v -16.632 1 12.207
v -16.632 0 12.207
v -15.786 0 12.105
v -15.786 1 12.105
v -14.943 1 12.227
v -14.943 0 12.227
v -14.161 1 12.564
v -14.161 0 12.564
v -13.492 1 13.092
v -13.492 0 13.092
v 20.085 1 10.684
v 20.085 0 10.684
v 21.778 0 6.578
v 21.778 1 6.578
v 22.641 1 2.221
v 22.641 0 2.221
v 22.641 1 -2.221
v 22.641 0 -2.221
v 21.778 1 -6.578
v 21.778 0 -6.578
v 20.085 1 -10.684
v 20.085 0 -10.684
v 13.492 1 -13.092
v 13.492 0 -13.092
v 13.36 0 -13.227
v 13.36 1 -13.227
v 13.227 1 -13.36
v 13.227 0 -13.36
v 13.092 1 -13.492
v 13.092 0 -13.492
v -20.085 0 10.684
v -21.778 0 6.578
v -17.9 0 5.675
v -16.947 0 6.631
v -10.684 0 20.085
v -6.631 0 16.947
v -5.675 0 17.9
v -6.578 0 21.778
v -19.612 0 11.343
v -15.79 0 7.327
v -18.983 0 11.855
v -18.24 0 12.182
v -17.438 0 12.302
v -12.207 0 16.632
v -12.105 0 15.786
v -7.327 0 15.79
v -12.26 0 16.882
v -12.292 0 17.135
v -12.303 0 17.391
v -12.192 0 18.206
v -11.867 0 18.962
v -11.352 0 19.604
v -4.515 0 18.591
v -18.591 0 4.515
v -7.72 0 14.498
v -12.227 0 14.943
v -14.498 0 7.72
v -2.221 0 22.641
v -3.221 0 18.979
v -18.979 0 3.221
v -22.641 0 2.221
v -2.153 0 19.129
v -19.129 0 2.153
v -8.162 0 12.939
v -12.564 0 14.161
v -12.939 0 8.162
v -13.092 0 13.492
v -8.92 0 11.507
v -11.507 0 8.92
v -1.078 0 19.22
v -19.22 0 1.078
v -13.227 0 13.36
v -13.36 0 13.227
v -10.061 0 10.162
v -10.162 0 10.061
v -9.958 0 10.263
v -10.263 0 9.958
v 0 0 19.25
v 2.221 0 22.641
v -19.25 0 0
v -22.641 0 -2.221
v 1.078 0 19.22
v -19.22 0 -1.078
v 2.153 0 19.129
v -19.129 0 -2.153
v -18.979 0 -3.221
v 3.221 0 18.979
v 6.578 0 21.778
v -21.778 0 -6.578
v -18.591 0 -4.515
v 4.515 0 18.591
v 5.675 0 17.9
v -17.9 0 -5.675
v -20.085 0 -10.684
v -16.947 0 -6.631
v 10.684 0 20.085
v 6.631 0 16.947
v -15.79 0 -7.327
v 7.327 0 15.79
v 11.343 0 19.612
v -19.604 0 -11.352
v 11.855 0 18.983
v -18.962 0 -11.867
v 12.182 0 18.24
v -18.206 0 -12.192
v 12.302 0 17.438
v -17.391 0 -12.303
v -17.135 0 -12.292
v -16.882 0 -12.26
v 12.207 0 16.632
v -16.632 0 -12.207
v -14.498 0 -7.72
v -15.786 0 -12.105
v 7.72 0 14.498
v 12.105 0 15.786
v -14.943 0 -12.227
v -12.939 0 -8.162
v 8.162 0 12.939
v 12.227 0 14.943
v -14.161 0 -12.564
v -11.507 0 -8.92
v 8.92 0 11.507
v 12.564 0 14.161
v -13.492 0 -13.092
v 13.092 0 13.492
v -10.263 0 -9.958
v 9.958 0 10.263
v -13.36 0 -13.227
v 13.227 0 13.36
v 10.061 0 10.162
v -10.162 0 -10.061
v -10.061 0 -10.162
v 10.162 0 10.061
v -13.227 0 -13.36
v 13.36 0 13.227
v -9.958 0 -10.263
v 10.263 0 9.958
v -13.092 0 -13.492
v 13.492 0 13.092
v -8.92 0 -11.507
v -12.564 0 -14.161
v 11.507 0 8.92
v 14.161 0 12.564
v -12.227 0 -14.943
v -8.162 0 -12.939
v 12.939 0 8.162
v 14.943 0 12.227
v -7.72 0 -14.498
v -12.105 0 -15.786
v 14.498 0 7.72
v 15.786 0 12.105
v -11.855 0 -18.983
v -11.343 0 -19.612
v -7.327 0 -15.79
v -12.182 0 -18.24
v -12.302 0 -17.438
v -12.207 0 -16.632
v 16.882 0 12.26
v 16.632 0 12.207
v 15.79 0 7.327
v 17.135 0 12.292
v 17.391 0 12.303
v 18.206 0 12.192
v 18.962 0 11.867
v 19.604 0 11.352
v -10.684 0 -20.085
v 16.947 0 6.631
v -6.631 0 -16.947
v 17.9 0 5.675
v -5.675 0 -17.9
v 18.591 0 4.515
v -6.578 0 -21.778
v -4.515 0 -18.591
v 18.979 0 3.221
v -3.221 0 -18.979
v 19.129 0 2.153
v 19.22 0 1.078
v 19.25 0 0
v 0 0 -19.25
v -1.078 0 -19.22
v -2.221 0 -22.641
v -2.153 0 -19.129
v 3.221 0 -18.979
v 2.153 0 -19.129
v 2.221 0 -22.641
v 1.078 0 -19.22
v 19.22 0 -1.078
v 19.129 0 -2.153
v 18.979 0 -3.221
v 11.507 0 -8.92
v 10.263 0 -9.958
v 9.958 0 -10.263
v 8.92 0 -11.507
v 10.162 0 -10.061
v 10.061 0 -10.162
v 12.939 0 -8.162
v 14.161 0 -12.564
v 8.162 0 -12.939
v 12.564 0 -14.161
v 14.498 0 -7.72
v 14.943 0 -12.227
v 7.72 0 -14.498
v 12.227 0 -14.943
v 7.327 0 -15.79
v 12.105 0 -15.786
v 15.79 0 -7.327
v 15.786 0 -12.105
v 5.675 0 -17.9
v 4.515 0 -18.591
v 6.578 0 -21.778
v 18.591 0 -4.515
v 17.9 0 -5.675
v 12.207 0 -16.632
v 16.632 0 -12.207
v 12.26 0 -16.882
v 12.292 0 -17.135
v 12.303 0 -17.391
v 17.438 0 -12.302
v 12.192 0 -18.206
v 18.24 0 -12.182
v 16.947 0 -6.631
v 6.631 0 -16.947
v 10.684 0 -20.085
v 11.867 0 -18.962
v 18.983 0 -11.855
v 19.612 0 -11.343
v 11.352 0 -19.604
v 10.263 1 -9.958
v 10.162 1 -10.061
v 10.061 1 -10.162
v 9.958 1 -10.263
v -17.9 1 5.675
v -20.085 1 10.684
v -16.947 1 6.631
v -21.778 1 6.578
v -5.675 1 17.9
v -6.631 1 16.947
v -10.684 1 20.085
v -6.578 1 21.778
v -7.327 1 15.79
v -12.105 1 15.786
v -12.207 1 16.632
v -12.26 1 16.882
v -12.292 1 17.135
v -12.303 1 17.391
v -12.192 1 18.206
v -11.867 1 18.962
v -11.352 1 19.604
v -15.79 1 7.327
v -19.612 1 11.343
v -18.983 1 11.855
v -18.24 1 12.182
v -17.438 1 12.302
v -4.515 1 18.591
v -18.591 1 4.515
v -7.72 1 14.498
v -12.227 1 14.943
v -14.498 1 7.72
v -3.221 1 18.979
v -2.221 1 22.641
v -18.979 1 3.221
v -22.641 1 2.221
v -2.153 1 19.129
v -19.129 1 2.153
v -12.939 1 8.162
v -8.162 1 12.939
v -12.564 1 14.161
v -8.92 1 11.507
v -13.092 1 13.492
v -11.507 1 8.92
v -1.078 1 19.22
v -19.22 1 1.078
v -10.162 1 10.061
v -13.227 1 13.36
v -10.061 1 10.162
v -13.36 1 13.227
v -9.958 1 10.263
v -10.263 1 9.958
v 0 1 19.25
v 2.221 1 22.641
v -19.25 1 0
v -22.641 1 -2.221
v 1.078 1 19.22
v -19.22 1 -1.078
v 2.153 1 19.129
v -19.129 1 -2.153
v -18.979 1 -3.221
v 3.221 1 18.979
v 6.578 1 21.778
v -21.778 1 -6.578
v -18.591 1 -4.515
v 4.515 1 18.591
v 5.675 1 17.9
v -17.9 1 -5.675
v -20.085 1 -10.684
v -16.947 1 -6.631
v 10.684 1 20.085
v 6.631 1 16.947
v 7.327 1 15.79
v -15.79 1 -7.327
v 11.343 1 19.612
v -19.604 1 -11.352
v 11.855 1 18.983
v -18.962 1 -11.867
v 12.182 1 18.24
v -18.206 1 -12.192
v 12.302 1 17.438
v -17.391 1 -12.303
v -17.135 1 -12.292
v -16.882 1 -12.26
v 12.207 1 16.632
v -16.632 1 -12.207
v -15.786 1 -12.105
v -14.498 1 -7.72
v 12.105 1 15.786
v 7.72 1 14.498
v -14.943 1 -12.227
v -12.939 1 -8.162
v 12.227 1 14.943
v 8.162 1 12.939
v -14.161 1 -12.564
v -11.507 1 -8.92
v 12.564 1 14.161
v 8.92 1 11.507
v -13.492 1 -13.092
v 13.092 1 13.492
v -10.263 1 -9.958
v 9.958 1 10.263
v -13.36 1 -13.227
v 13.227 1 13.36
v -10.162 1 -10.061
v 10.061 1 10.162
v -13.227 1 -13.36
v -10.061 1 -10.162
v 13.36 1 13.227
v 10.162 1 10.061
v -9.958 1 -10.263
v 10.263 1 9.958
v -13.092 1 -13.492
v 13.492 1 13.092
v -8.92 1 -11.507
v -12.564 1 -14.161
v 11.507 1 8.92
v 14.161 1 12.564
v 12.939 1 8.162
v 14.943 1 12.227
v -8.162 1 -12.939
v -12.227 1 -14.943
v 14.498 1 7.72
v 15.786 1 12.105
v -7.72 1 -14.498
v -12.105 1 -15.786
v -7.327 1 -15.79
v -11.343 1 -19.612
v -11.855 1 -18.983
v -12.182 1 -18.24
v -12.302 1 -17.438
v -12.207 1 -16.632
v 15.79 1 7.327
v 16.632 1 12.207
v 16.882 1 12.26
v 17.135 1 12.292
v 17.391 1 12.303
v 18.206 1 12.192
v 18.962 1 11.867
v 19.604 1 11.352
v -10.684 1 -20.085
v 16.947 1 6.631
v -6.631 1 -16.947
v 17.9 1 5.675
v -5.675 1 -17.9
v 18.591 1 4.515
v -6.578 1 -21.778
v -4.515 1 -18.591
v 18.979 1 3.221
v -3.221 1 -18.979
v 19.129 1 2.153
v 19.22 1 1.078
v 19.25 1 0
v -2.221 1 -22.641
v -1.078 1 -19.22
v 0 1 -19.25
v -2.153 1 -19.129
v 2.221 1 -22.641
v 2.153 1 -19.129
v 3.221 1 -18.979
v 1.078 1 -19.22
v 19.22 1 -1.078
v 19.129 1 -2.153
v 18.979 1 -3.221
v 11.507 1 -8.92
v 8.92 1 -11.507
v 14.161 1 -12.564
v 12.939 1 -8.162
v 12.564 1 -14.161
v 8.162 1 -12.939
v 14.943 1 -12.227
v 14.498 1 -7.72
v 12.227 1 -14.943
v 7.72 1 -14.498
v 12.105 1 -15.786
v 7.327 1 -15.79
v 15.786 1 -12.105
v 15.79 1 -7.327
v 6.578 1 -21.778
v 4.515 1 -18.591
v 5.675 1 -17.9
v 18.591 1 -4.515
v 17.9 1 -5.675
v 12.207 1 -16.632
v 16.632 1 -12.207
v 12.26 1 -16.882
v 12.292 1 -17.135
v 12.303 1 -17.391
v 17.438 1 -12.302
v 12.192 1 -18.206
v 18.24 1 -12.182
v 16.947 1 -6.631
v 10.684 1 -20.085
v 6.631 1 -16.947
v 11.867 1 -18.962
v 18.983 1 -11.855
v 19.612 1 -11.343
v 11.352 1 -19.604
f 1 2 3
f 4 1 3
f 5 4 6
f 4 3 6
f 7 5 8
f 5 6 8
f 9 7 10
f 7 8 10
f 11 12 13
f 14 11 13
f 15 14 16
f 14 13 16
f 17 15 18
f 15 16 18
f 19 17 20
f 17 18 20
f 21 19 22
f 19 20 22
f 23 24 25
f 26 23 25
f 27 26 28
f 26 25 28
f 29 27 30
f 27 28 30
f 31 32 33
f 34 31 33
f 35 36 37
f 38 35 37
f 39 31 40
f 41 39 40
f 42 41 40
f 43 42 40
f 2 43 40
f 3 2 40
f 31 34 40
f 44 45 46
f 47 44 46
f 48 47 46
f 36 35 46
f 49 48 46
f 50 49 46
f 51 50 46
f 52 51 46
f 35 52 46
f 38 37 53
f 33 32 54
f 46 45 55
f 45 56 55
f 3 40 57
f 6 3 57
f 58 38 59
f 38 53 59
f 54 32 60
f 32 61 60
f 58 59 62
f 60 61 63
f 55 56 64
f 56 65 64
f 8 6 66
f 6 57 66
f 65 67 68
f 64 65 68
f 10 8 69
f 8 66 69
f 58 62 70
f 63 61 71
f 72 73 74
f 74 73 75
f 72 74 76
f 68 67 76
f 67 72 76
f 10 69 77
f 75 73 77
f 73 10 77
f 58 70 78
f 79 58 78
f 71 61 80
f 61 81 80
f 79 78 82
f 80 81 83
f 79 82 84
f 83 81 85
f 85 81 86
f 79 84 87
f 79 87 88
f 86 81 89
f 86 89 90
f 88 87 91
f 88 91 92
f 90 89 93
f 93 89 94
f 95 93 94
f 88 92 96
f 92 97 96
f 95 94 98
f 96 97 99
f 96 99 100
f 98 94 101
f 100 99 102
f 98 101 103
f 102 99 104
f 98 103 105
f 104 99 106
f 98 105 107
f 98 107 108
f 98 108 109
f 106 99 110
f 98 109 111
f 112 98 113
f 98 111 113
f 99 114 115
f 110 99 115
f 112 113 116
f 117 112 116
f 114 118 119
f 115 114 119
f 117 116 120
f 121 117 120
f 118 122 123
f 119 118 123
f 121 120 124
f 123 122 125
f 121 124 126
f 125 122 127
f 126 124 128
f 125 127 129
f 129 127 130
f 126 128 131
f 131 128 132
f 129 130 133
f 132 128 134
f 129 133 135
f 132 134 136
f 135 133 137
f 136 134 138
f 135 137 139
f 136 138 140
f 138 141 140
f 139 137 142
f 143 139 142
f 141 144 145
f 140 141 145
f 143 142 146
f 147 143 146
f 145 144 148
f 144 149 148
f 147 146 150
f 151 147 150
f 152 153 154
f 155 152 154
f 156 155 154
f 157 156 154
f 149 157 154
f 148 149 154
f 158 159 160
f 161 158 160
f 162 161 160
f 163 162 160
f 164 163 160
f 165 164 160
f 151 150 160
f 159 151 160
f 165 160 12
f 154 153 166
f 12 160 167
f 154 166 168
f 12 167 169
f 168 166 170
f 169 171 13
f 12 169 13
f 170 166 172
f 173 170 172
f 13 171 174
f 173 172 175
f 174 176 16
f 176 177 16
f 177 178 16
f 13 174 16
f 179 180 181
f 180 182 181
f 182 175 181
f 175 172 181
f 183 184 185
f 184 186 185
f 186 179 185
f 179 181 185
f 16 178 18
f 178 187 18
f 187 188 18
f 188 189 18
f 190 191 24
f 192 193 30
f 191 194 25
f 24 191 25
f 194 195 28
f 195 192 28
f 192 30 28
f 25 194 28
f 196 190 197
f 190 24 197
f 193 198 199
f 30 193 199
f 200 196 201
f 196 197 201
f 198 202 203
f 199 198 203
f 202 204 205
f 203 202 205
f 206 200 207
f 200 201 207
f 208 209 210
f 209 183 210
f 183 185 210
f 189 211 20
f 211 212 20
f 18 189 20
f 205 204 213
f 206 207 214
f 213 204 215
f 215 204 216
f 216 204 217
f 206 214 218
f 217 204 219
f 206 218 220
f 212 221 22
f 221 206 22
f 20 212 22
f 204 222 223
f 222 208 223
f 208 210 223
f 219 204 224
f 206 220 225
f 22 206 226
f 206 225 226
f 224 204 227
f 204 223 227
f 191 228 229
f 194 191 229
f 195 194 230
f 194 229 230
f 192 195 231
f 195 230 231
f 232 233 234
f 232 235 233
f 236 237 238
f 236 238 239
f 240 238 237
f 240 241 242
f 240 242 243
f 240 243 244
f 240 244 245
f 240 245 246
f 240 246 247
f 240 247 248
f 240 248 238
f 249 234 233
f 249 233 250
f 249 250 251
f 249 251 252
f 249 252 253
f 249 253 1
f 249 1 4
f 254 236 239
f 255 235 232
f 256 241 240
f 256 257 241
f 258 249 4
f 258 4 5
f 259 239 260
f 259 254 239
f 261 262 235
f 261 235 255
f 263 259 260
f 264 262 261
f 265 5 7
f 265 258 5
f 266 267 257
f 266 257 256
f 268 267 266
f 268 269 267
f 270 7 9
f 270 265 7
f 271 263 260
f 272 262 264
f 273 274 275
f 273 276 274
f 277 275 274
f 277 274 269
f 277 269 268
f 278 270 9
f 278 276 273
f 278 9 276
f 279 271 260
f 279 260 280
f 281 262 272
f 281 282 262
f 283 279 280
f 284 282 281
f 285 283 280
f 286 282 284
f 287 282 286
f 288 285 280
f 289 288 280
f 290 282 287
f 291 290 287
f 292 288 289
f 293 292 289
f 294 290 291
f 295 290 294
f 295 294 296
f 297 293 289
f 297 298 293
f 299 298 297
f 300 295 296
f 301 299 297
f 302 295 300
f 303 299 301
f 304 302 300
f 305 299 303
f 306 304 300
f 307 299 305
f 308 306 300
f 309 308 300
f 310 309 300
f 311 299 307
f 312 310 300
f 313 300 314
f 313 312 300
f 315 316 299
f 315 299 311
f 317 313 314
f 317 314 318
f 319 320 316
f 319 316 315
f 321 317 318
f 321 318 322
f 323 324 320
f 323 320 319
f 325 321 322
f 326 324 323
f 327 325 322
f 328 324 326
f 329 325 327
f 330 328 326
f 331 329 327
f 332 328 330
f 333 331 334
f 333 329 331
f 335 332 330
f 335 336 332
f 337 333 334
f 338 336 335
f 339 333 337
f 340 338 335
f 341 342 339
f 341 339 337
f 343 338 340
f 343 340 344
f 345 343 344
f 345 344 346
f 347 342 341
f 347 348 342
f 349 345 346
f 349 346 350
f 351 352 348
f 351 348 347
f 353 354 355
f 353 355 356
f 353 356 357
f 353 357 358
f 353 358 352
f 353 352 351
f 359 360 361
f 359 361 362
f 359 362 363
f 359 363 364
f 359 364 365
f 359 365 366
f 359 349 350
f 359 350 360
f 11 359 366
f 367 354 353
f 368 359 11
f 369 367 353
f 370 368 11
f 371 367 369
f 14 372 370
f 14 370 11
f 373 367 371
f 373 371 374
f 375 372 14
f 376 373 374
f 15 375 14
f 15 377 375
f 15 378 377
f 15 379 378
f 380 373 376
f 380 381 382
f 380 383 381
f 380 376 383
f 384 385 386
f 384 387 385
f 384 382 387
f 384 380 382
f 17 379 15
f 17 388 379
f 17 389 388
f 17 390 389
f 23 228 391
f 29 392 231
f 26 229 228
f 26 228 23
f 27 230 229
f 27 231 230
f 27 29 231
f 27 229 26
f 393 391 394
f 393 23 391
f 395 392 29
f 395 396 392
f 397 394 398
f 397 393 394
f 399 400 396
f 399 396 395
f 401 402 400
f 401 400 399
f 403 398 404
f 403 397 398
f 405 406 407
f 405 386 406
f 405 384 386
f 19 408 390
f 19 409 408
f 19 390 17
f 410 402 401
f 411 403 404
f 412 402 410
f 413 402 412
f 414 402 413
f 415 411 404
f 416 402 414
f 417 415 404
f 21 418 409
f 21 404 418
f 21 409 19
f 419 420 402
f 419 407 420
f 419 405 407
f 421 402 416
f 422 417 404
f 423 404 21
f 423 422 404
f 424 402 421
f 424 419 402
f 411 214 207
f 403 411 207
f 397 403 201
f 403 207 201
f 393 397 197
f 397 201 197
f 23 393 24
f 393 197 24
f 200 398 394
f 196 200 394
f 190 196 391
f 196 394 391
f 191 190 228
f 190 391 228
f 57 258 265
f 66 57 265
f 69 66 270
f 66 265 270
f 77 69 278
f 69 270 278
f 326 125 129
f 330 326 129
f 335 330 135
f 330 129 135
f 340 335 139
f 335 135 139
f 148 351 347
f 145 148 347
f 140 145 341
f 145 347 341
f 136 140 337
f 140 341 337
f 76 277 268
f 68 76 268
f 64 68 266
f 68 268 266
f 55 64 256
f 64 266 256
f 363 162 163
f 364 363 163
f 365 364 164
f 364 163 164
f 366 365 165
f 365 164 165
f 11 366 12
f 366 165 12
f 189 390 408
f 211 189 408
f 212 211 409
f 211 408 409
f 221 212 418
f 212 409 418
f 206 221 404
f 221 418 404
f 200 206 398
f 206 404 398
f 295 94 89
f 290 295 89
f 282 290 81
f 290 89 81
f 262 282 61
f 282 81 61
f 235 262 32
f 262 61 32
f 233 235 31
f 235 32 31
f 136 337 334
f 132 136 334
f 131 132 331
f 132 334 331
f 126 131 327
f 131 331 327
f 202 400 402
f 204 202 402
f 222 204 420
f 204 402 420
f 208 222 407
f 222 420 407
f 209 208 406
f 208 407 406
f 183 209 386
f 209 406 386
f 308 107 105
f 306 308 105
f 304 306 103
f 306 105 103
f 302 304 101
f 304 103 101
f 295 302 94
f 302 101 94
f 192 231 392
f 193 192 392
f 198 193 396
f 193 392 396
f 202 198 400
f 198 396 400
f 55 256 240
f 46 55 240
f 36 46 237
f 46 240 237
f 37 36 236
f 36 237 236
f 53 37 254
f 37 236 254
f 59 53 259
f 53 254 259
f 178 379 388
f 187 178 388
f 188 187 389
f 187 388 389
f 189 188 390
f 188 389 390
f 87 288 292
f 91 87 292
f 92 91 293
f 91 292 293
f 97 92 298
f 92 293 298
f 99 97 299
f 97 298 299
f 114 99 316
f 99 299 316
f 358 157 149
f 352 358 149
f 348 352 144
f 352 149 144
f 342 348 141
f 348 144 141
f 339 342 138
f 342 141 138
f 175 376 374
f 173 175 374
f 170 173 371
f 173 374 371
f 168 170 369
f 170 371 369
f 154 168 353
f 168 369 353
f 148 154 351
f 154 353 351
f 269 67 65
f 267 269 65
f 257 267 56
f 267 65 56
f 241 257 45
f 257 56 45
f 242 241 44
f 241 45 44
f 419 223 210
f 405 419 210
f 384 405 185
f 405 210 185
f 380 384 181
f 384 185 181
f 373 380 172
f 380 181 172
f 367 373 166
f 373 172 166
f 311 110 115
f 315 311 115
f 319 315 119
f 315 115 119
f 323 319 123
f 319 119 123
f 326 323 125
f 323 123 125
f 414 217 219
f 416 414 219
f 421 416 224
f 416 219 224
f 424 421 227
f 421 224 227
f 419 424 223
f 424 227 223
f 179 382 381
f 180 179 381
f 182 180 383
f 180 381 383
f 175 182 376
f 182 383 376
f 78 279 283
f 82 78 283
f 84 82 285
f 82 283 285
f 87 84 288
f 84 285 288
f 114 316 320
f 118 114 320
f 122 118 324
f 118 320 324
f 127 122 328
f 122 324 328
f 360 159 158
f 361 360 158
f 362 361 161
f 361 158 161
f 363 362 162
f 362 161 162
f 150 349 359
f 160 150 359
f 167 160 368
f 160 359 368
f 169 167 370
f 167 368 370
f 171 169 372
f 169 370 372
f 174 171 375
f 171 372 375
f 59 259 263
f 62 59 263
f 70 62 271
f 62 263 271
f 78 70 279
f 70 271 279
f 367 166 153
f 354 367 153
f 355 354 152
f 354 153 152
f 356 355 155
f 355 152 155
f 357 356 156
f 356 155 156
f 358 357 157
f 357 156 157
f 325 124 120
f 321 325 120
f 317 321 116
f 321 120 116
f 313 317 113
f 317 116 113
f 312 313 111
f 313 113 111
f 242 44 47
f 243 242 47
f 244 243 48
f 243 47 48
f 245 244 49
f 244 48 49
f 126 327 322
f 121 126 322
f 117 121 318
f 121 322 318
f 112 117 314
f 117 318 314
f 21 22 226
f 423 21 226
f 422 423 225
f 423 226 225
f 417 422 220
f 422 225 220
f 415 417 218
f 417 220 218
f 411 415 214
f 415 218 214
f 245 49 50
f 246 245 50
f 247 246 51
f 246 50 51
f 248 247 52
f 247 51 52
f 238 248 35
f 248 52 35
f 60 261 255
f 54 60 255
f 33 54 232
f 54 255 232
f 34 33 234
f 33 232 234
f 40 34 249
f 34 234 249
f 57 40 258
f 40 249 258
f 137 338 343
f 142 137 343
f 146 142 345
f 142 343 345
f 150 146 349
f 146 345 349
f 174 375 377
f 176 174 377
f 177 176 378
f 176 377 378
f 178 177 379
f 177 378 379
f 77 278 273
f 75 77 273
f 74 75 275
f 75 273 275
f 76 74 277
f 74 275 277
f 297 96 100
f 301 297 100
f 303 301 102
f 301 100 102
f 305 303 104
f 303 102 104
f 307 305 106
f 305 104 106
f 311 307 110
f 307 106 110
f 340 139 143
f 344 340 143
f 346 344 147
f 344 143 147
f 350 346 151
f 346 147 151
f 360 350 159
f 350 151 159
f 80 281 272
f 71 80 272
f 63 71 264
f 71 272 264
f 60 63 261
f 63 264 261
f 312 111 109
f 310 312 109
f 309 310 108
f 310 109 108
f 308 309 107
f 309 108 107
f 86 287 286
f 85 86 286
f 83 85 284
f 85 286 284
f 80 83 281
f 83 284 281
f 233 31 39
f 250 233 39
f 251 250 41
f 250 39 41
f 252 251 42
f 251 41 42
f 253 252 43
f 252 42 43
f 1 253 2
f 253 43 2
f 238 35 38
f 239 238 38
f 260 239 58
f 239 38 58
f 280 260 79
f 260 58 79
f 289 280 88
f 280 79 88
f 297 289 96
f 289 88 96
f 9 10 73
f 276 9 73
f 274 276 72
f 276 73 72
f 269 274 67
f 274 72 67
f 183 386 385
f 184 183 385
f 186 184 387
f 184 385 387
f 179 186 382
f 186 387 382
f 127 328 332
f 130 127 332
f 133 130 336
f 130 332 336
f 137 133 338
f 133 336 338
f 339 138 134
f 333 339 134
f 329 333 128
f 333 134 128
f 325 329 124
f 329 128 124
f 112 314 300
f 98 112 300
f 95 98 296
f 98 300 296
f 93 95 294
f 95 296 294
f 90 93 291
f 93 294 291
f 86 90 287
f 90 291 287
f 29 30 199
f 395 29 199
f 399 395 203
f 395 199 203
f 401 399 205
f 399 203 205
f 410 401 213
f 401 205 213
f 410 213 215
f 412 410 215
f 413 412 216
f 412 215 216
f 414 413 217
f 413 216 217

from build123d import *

# Parameters (mm, degrees)
PCB_OUTLINE_OUTER_DEPTH = 1
CUT_EXTRUDE2_DEPTH      = 1
CUT_EXTRUDE2_DEPTH_BACK = 2


with BuildPart() as part:
    # Internal Slab → PCB Outline Outer (new body)
    with BuildSketch(Plane(origin=(0, 0, 0), x_dir=(1, 0, 0), z_dir=(0, 1, 0))):
        with BuildLine():
            ThreePointArc((20.085113617, 10.68413361), (18.622288868, 12.043250737), (16.632261242, 12.207097181))
            ThreePointArc((16.632261242, 12.207097181), (14.943199752, 12.226998501), (13.492265758, 13.091935102))
            ThreePointArc((13.492265758, 13.091935102), (13.293607486, 13.293607486), (13.091935102, 13.492265758))
            ThreePointArc((13.091935102, 13.492265758), (12.226998501, 14.943199752), (12.207097181, 16.632261242))
            ThreePointArc((12.207097181, 16.632261242), (12.278791735, 17.008431368), (12.302815994, 17.390618375))
            ThreePointArc((12.302815994, 17.390618375), (11.867033623, 18.962276517), (10.68413361, 20.085113617))
            ThreePointArc((10.68413361, 20.085113617), (0, 22.75), (-10.68413361, 20.085113617))
            ThreePointArc((-10.68413361, 20.085113617), (-12.043250737, 18.622288868), (-12.207097181, 16.632261242))
            ThreePointArc((-12.207097181, 16.632261242), (-12.226998501, 14.943199752), (-13.091935102, 13.492265758))
            ThreePointArc((-13.091935102, 13.492265758), (-13.293607486, 13.293607486), (-13.492265758, 13.091935102))
            ThreePointArc((-13.492265758, 13.091935102), (-14.943199752, 12.226998501), (-16.632261242, 12.207097181))
            ThreePointArc((-16.632261242, 12.207097181), (-17.008431368, 12.278791735), (-17.390618375, 12.302815994))
            ThreePointArc((-17.390618375, 12.302815994), (-18.962276517, 11.867033623), (-20.085113617, 10.68413361))
            ThreePointArc((-20.085113617, 10.68413361), (-22.75, 0), (-20.085113617, -10.68413361))
            ThreePointArc((-20.085113617, -10.68413361), (-18.622288868, -12.043250737), (-16.632261242, -12.207097181))
            ThreePointArc((-16.632261242, -12.207097181), (-14.943199752, -12.226998501), (-13.492265758, -13.091935102))
            ThreePointArc((-13.492265758, -13.091935102), (-13.293607486, -13.293607486), (-13.091935102, -13.492265758))
            ThreePointArc((-13.091935102, -13.492265758), (-12.226998501, -14.943199752), (-12.207097181, -16.632261242))
            ThreePointArc((-12.207097181, -16.632261242), (-12.278791735, -17.008431368), (-12.302815994, -17.390618375))
            ThreePointArc((-12.302815994, -17.390618375), (-11.867033623, -18.962276517), (-10.68413361, -20.085113617))
            ThreePointArc((-10.68413361, -20.085113617), (0, -22.75), (10.68413361, -20.085113617))
            ThreePointArc((10.68413361, -20.085113617), (12.043250737, -18.622288868), (12.207097181, -16.632261242))
            ThreePointArc((12.207097181, -16.632261242), (12.226998501, -14.943199752), (13.091935102, -13.492265758))
            ThreePointArc((13.091935102, -13.492265758), (13.293607486, -13.293607486), (13.492265758, -13.091935102))
            ThreePointArc((13.492265758, -13.091935102), (14.943199752, -12.226998501), (16.632261242, -12.207097181))
            ThreePointArc((16.632261242, -12.207097181), (17.008431368, -12.278791735), (17.390618375, -12.302815994))
            ThreePointArc((17.390618375, -12.302815994), (18.962276517, -11.867033623), (20.085113617, -10.68413361))
            ThreePointArc((20.085113617, -10.68413361), (22.75, 0), (20.085113617, 10.68413361))
        make_face()
    extrude(amount=PCB_OUTLINE_OUTER_DEPTH)

    # Sketch7 → Cut-Extrude2 (cut, two sides)
    with BuildSketch(Plane(origin=(0, 1, 0), x_dir=(1, 0, 0), z_dir=(0, 1, 0))) as cut_extrude2_sk:
        with BuildLine():
            ThreePointArc((0, 19.25), (-1.616279551, 19.182026494), (-3.221144642, 18.978586017))
            ThreePointArc((-3.221144642, 18.978586017), (-6.18224043, 17.452869559), (-7.719604793, 14.497804451))
            ThreePointArc((-7.719604793, 14.497804451), (-8.503489746, 12.202965765), (-9.958227232, 10.262734061))
            ThreePointArc((-9.958227232, 10.262734061), (-10.111626971, 10.111626971), (-10.262734061, 9.958227232))
            ThreePointArc((-10.262734061, 9.958227232), (-12.202965765, 8.503489746), (-14.497804451, 7.719604793))
            ThreePointArc((-14.497804451, 7.719604793), (-17.452869559, 6.18224043), (-18.978586017, 3.221144642))
            ThreePointArc((-18.978586017, 3.221144642), (-19.182026494, 1.616279551), (-19.25, 0))
            ThreePointArc((-19.25, 0), (-19.182026494, -1.616279551), (-18.978586017, -3.221144642))
            ThreePointArc((-18.978586017, -3.221144642), (-17.452869559, -6.18224043), (-14.497804451, -7.719604793))
            ThreePointArc((-14.497804451, -7.719604793), (-12.202965765, -8.503489746), (-10.262734061, -9.958227232))
            ThreePointArc((-10.262734061, -9.958227232), (-10.111626971, -10.111626971), (-9.958227232, -10.262734061))
            ThreePointArc((-9.958227232, -10.262734061), (-8.503489746, -12.202965765), (-7.719604793, -14.497804451))
            ThreePointArc((-7.719604793, -14.497804451), (-6.18224043, -17.452869559), (-3.221144642, -18.978586017))
            ThreePointArc((-3.221144642, -18.978586017), (-1.616279551, -19.182026494), (0, -19.25))
            ThreePointArc((0, -19.25), (1.616279551, -19.182026494), (3.221144642, -18.978586017))
            ThreePointArc((3.221144642, -18.978586017), (6.18224043, -17.452869559), (7.719604793, -14.497804451))
            ThreePointArc((7.719604793, -14.497804451), (8.503489746, -12.202965765), (9.958227232, -10.262734061))
            ThreePointArc((9.958227232, -10.262734061), (10.111626971, -10.111626971), (10.262734061, -9.958227232))
            ThreePointArc((10.262734061, -9.958227232), (12.202965765, -8.503489746), (14.497804451, -7.719604793))
            ThreePointArc((14.497804451, -7.719604793), (17.452869559, -6.18224043), (18.978586017, -3.221144642))
            ThreePointArc((18.978586017, -3.221144642), (19.182026494, -1.616279551), (19.25, 0))
            ThreePointArc((19.25, 0), (19.182026494, 1.616279551), (18.978586017, 3.221144642))
            ThreePointArc((18.978586017, 3.221144642), (17.452869559, 6.18224043), (14.497804451, 7.719604793))
            ThreePointArc((14.497804451, 7.719604793), (12.202965765, 8.503489746), (10.262734061, 9.958227232))
            ThreePointArc((10.262734061, 9.958227232), (10.111626971, 10.111626971), (9.958227232, 10.262734061))
            ThreePointArc((9.958227232, 10.262734061), (8.503489746, 12.202965765), (7.719604793, 14.497804451))
            ThreePointArc((7.719604793, 14.497804451), (6.18224043, 17.452869559), (3.221144642, 18.978586017))
            ThreePointArc((3.221144642, 18.978586017), (1.616279551, 19.182026494), (0, 19.25))
        make_face()
    extrude(amount=CUT_EXTRUDE2_DEPTH, mode=Mode.SUBTRACT)
    extrude(cut_extrude2_sk.sketch, amount=-CUT_EXTRUDE2_DEPTH_BACK, mode=Mode.SUBTRACT)


solid = part.part
